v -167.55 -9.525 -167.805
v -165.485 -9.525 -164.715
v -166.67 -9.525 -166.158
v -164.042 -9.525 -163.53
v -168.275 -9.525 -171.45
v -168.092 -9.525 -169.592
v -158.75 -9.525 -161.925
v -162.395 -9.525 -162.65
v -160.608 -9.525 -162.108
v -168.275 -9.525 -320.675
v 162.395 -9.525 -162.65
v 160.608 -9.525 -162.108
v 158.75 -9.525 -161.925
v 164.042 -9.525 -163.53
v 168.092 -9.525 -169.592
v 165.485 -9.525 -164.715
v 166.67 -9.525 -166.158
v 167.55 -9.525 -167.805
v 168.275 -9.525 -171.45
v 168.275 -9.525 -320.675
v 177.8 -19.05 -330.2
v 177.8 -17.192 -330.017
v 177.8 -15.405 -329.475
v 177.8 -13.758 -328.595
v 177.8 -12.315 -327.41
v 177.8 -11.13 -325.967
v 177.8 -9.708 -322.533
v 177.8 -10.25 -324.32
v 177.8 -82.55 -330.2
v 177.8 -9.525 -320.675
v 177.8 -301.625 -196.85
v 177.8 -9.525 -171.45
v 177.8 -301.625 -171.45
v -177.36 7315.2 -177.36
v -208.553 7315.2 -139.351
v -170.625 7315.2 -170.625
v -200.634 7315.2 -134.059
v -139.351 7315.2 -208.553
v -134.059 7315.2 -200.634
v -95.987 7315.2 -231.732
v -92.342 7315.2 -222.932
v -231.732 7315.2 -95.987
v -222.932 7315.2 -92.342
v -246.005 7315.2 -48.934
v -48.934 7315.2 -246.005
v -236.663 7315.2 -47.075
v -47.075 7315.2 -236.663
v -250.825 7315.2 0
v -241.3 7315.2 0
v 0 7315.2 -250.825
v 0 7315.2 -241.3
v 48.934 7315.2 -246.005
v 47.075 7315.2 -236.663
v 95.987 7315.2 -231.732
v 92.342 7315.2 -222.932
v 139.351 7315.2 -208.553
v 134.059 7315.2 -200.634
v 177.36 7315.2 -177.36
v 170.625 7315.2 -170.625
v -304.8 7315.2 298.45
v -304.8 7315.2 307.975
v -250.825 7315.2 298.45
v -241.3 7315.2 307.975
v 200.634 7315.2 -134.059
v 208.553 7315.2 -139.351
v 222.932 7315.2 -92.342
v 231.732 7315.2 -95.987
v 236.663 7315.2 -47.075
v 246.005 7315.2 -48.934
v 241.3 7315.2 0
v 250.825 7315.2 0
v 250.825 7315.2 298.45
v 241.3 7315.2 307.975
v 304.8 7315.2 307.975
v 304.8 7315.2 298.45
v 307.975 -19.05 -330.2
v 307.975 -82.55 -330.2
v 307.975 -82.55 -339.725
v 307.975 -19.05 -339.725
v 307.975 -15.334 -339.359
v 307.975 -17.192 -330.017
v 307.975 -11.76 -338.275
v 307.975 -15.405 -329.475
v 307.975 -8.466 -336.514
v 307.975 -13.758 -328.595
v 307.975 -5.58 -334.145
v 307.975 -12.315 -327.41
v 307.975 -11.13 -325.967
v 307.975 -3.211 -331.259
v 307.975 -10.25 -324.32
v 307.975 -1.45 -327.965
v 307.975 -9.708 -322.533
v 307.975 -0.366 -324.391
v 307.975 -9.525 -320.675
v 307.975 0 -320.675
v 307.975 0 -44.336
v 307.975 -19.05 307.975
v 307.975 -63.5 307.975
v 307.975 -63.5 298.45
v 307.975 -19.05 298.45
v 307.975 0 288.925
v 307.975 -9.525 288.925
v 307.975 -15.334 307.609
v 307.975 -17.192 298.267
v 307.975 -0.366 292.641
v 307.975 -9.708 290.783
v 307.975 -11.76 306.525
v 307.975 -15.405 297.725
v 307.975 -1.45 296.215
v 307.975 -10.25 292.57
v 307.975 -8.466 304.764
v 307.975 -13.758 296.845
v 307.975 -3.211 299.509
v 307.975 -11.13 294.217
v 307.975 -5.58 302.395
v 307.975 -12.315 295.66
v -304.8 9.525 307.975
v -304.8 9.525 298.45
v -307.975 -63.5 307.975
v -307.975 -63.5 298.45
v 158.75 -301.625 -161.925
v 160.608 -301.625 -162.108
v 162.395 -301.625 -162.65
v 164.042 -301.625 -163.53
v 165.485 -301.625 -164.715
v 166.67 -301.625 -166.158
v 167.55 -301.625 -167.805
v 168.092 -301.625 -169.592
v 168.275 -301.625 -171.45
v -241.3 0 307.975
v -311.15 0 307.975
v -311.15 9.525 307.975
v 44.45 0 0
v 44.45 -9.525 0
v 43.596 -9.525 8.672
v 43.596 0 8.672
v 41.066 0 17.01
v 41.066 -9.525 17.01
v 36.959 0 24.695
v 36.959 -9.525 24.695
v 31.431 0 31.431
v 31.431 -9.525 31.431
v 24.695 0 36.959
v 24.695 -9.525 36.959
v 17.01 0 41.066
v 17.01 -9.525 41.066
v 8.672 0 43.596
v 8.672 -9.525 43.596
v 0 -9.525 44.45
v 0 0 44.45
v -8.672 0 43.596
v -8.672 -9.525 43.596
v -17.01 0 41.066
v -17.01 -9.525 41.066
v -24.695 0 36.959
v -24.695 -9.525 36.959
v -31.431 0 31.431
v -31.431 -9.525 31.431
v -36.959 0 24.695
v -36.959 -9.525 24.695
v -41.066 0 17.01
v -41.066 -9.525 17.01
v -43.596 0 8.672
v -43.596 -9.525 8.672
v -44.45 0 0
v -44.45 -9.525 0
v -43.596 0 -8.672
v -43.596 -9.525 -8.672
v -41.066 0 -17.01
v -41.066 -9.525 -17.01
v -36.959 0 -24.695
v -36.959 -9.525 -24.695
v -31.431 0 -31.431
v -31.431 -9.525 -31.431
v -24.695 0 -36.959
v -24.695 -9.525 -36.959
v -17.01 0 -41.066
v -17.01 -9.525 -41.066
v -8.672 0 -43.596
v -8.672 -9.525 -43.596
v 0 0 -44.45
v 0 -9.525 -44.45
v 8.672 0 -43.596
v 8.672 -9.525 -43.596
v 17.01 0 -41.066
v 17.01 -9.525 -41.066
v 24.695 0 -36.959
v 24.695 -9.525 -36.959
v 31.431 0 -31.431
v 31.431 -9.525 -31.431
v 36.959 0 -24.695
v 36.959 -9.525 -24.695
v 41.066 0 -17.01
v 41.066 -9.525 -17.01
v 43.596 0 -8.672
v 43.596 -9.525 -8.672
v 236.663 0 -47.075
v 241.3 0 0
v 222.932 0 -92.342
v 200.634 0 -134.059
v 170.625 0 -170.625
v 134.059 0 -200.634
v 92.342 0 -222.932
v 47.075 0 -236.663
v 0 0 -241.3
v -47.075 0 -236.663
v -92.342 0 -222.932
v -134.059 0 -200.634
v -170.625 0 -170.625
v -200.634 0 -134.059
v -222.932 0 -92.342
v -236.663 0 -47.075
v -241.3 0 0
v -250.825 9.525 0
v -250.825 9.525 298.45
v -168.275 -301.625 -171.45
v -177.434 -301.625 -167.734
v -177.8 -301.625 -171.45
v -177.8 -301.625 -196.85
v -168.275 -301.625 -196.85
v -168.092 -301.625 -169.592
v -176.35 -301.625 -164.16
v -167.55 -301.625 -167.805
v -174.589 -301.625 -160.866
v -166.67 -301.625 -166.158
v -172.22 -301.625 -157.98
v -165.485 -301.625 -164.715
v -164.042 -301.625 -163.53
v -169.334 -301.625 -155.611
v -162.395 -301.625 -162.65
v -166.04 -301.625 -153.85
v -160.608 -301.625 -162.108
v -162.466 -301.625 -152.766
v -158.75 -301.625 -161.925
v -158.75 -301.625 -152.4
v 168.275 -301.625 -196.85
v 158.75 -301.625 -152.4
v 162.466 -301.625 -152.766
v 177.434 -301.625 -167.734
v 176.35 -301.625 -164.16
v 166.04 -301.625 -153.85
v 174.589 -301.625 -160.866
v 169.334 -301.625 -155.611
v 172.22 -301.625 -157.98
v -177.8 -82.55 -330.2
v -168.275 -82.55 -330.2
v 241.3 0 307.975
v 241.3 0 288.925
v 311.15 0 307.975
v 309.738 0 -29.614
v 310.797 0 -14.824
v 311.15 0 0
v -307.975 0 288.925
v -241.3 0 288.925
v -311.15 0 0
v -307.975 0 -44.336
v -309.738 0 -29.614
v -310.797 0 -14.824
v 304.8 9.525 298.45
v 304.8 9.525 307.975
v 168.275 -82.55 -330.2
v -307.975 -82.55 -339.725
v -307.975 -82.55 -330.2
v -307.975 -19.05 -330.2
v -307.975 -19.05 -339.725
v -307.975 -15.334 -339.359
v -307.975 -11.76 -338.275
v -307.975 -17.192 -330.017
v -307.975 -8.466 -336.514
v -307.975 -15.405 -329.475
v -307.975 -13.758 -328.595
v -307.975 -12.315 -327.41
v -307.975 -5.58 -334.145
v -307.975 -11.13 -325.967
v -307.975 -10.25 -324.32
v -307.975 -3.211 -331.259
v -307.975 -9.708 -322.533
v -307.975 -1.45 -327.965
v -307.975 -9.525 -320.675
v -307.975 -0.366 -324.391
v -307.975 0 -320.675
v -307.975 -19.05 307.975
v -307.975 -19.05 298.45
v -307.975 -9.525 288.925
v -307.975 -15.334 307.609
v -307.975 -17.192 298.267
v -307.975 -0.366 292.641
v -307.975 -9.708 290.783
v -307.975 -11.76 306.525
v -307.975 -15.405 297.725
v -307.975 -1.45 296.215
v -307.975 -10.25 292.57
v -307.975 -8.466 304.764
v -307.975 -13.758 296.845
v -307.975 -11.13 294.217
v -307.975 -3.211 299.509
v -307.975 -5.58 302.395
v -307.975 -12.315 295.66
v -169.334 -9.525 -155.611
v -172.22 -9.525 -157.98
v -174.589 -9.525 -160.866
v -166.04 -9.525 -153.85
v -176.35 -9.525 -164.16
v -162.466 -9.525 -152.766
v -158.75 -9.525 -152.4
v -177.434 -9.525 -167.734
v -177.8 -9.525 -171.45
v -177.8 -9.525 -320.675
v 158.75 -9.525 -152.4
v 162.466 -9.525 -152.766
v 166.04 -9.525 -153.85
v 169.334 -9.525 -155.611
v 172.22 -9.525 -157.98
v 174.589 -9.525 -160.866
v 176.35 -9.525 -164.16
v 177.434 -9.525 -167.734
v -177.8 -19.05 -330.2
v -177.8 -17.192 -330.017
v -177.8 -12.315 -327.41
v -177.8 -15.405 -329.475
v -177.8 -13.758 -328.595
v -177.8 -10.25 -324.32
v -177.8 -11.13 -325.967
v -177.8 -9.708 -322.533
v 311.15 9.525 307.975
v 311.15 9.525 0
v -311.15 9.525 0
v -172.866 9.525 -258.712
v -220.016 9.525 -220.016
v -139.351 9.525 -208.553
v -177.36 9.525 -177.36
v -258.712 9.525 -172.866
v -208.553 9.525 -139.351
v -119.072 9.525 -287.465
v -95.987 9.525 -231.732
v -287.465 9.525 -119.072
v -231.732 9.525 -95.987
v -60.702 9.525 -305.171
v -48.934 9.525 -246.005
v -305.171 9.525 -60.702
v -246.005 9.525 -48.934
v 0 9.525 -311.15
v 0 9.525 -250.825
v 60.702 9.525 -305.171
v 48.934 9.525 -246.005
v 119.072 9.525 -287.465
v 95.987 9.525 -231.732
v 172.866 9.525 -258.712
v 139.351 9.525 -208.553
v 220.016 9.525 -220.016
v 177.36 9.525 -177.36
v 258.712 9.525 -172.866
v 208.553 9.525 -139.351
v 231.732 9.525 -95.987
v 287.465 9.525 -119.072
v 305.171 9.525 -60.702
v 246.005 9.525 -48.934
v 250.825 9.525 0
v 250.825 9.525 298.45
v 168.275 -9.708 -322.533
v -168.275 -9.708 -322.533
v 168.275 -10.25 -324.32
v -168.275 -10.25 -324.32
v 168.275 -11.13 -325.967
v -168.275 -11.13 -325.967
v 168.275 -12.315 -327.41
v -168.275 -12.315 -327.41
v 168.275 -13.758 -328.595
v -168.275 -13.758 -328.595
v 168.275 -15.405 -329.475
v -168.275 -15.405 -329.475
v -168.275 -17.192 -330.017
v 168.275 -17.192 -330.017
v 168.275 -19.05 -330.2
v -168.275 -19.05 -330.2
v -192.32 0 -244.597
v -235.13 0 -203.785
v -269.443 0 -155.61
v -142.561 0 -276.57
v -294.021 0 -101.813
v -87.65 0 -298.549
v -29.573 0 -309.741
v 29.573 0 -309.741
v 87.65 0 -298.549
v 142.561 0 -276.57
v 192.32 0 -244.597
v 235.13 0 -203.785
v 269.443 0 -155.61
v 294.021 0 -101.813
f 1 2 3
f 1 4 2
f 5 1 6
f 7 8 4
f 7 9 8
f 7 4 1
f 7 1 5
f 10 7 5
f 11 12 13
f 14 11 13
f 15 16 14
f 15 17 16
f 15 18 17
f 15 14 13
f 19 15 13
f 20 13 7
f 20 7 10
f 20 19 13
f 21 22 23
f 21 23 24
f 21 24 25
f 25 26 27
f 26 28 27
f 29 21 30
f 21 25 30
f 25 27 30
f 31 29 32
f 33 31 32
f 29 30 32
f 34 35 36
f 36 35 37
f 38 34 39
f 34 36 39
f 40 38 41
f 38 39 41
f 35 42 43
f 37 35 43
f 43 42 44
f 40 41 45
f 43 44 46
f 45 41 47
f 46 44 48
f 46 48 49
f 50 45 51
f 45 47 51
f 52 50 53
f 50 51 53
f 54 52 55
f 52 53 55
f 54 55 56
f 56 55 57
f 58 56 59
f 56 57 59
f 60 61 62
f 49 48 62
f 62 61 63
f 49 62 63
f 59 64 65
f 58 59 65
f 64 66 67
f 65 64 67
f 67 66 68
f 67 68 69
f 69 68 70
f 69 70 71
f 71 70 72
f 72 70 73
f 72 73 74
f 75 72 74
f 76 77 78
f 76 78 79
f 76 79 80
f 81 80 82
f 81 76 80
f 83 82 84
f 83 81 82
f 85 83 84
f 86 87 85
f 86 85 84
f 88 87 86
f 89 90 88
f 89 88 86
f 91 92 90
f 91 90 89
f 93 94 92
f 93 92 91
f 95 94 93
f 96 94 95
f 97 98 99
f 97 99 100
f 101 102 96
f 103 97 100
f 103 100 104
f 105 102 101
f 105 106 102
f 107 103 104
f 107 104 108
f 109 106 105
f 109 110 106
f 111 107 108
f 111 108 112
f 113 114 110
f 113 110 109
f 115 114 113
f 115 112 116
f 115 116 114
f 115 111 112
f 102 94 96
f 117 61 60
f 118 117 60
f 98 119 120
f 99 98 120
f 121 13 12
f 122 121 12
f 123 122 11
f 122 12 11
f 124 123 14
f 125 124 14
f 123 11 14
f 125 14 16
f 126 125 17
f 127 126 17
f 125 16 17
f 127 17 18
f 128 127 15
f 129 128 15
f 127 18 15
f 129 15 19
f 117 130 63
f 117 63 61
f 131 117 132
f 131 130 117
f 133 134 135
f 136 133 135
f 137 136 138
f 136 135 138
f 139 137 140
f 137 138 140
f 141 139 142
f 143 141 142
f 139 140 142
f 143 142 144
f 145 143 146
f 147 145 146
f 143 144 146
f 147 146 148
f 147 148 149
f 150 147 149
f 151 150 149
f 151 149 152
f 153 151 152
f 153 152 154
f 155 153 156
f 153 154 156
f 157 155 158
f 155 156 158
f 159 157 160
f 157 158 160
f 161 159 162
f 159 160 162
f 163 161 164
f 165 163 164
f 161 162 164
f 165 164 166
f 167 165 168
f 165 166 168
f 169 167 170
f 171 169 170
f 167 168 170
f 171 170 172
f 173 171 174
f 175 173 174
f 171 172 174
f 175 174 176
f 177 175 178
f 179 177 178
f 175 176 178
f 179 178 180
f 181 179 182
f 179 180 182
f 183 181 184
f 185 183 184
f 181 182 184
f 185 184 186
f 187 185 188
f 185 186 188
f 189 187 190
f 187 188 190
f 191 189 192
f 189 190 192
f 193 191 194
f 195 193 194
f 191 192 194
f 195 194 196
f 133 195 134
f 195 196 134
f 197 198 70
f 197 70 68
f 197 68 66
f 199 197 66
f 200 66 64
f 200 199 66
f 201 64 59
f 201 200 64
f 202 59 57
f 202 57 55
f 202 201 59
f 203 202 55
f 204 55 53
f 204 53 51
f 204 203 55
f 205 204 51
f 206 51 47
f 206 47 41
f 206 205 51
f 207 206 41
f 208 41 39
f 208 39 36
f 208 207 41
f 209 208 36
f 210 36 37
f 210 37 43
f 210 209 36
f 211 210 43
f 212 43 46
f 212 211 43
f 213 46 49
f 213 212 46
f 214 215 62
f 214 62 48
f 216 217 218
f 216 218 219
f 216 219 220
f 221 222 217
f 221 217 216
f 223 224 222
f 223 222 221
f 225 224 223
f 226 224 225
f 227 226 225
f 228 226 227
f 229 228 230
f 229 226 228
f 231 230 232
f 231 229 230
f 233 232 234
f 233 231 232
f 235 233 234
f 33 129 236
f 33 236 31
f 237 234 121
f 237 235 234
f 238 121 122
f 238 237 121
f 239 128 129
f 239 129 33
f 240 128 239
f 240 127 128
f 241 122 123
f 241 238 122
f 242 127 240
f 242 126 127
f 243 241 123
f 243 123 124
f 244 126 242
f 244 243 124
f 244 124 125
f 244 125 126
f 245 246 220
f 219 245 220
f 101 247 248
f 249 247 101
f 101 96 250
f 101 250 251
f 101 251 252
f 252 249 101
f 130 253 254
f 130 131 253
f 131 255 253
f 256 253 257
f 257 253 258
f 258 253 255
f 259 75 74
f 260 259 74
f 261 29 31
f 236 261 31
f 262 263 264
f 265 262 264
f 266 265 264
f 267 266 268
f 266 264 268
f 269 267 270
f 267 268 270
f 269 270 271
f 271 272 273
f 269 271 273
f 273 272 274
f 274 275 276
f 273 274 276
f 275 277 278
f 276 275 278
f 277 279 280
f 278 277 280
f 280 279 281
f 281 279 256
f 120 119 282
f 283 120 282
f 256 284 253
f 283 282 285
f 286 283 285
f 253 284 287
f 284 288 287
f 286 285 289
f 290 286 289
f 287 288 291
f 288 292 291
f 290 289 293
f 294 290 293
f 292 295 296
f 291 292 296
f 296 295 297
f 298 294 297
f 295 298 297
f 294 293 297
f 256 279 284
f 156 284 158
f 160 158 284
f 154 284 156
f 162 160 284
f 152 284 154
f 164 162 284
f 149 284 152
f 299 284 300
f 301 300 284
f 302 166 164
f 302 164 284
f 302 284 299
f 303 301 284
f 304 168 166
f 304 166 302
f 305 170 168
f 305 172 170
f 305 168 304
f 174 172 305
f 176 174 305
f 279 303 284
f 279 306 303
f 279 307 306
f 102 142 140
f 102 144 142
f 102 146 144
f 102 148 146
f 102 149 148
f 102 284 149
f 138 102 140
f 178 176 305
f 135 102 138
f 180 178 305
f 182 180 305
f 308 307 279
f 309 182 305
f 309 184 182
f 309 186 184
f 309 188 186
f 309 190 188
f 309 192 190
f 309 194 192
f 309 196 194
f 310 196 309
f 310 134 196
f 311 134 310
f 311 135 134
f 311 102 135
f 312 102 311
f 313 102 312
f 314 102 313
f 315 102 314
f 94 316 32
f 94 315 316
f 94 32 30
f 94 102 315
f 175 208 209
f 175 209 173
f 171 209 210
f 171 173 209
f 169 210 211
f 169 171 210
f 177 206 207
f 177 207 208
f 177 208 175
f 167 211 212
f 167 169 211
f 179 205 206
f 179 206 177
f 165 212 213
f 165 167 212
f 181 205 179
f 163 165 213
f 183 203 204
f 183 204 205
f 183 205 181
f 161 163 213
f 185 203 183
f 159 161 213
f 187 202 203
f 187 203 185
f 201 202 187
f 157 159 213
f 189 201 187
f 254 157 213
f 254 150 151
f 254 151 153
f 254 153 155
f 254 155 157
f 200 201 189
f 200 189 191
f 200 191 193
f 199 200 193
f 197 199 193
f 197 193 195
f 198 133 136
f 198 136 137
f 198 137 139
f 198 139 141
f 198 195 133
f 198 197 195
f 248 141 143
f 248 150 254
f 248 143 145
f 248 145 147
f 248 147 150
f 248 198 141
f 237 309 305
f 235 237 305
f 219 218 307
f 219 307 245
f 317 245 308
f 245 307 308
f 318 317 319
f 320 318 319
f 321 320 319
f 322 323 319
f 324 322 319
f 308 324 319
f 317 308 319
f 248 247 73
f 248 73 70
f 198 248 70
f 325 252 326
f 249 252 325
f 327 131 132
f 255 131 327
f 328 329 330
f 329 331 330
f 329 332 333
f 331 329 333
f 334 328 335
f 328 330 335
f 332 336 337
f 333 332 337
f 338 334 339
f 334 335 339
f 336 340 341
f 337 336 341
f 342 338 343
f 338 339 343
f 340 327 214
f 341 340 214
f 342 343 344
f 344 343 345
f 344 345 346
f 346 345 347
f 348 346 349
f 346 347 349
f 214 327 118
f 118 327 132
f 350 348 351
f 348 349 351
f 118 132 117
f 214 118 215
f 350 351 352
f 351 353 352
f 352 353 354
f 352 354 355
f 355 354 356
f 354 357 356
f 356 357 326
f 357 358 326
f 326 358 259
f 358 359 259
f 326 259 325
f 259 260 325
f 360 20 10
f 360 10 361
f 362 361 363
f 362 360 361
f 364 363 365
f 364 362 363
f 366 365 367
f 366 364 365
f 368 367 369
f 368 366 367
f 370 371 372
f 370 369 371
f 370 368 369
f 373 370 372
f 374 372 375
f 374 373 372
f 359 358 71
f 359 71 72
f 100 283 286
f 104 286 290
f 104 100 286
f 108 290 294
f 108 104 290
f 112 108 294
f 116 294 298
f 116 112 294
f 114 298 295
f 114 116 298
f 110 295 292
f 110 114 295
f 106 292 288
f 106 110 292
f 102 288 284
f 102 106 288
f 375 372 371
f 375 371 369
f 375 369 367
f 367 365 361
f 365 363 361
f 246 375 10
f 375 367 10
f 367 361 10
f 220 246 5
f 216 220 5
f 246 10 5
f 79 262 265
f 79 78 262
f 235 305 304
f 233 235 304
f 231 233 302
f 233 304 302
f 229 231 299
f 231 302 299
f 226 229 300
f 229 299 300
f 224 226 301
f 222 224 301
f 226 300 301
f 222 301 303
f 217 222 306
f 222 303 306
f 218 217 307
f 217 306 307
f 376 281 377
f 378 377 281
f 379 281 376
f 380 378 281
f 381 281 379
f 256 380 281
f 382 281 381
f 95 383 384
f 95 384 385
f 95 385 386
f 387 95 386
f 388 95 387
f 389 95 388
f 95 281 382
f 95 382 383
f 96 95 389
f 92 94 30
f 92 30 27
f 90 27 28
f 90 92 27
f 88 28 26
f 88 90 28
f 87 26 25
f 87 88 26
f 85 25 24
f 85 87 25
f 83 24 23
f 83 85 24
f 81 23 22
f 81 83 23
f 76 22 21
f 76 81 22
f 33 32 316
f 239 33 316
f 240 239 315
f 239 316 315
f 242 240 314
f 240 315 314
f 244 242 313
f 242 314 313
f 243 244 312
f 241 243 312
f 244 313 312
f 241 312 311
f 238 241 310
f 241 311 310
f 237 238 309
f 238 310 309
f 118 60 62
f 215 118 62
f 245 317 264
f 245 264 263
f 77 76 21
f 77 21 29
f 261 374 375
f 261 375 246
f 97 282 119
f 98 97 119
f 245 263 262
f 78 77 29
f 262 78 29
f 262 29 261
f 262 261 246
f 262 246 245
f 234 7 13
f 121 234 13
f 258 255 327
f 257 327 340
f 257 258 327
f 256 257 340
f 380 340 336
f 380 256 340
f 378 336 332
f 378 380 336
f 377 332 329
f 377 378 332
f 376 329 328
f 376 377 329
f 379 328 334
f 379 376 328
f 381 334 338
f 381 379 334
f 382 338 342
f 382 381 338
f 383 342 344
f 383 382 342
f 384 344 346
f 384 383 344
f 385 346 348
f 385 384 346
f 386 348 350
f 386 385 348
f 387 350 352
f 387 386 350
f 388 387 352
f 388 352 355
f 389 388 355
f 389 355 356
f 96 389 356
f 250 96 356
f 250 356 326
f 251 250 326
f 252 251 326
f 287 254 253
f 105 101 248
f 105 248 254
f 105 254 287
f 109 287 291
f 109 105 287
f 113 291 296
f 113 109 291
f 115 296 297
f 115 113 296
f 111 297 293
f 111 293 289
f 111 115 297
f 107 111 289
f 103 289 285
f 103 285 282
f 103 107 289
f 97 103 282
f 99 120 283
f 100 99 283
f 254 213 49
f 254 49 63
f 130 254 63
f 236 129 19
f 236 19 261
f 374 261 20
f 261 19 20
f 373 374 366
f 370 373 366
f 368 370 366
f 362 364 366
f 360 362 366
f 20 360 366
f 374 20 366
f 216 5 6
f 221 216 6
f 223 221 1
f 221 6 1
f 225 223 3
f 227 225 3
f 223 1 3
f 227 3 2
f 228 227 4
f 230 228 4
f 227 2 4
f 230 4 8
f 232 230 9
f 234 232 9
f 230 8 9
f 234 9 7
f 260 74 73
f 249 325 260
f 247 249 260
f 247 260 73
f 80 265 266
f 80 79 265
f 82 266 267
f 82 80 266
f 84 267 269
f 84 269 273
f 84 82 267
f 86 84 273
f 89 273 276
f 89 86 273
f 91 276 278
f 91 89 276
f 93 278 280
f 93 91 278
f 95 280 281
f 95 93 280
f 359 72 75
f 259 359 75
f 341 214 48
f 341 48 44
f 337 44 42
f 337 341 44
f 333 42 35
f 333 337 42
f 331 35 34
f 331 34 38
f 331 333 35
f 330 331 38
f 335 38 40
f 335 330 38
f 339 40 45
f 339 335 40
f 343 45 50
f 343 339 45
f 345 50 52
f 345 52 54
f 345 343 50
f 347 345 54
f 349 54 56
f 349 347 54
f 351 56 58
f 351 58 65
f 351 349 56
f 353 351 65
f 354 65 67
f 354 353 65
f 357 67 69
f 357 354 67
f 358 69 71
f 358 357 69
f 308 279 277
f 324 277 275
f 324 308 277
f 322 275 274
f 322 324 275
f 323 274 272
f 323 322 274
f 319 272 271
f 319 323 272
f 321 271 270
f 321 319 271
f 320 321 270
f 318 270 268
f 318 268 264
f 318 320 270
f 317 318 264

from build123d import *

# Parameters (mm, degrees)
F1_DEPTH  = 7315.2
F3_DEPTH  = 9.525
F5_DEPTH  = 307.975
F6_R      = 44.45
F7_DEPTH  = 9.525
F9_DEPTH  = 292.1
F11_DEPTH = 488.951


with BuildPart() as f1:
    # F0 (on Front) → F1 (new body)
    with BuildSketch(Plane.XZ):
        with BuildLine():
            ThreePointArc((241.3, 0), (0, -241.3), (-241.3, 0))
            Line((-241.3, 0), (-241.3, 307.975))
            Line((-241.3, 307.975), (-304.8, 307.975))
            Line((-304.8, 307.975), (-304.8, 298.45))
            Line((-304.8, 298.45), (-250.825, 298.45))
            Line((-250.825, 298.45), (-250.825, 0))
            ThreePointArc((-250.825, 0), (0, -250.825), (250.825, 0))
            Line((250.825, 0), (250.825, 298.45))
            Line((250.825, 298.45), (304.8, 298.45))
            Line((304.8, 298.45), (304.8, 307.975))
            Line((304.8, 307.975), (241.3, 307.975))
            Line((241.3, 307.975), (241.3, 0))
        make_face()
    extrude(amount=-F1_DEPTH)

    # F2 (on Front) → F3 (join)
    with BuildSketch(Plane.XZ):
        with BuildLine():
            Line((-247.65, 0), (-247.65, 307.975))
            Line((-247.65, 307.975), (-311.15, 307.975))
            Line((-311.15, 307.975), (-311.15, 0))
            ThreePointArc((-311.15, 0), (0, -311.15), (311.15, 0))
            Line((311.15, 0), (311.15, 307.975))
            Line((311.15, 307.975), (247.65, 307.975))
            Line((247.65, 307.975), (247.65, 0))
            ThreePointArc((247.65, 0), (0, -247.65), (-247.65, 0))
        make_face()
    extrude(amount=-F3_DEPTH)

    # F4 (on Right) → F5 (join, symmetric)
    with BuildSketch(Plane.YZ):
        with BuildLine():
            Line((0, -320.675), (0, 288.925))
            ThreePointArc((0, 288.925), (-5.579616, 302.395384), (-19.05, 307.975))
            Line((-19.05, 307.975), (-63.5, 307.975))
            Line((-63.5, 307.975), (-63.5, 298.45))
            Line((-63.5, 298.45), (-19.05, 298.45))
            ThreePointArc((-19.05, 298.45), (-12.314808, 295.660192), (-9.525, 288.925))
            Line((-9.525, 288.925), (-9.525, -320.675))
            ThreePointArc((-9.525, -320.675), (-12.314808, -327.410192), (-19.05, -330.2))
            Line((-19.05, -330.2), (-82.55, -330.2))
            Line((-82.55, -330.2), (-82.55, -339.725))
            Line((-82.55, -339.725), (-19.05, -339.725))
            ThreePointArc((-19.05, -339.725), (-5.579616, -334.145384), (0, -320.675))
        make_face()
    extrude(amount=F5_DEPTH, both=True)

    # F6 (on face) → F7 (cut, through all)
    with BuildSketch(Plane.XZ.offset(9.525)):
        Circle(F6_R)
    extrude(amount=-F7_DEPTH, mode=Mode.SUBTRACT)

    # F8 (on face) → F9 (join)
    with BuildSketch(Plane.XZ.offset(9.525)):
        with BuildLine():
            Line((-177.8, -171.45), (-177.8, -330.2))
            Line((-177.8, -330.2), (-168.275, -330.2))
            Line((-168.275, -330.2), (-168.275, -171.45))
            ThreePointArc((-168.275, -171.45), (-165.485192, -164.714808), (-158.75, -161.925))
            Line((-158.75, -161.925), (158.75, -161.925))
            ThreePointArc((158.75, -161.925), (165.485192, -164.714808), (168.275, -171.45))
            Line((168.275, -171.45), (168.275, -330.2))
            Line((168.275, -330.2), (177.8, -330.2))
            Line((177.8, -330.2), (177.8, -171.45))
            ThreePointArc((177.8, -171.45), (172.220384, -157.979616), (158.75, -152.4))
            Line((158.75, -152.4), (-158.75, -152.4))
            ThreePointArc((-158.75, -152.4), (-172.220384, -157.979616), (-177.8, -171.45))
        make_face()
    extrude(amount=F9_DEPTH)

    # F10 (on face) → F11 (cut, through all)
    with BuildSketch(Plane.YZ.offset(177.8)):
        Polygon((-301.625, -330.2), (-82.55, -330.2), (-301.625, -196.85), align=None)
    extrude(amount=-F11_DEPTH, mode=Mode.SUBTRACT)


solid = f1.part
